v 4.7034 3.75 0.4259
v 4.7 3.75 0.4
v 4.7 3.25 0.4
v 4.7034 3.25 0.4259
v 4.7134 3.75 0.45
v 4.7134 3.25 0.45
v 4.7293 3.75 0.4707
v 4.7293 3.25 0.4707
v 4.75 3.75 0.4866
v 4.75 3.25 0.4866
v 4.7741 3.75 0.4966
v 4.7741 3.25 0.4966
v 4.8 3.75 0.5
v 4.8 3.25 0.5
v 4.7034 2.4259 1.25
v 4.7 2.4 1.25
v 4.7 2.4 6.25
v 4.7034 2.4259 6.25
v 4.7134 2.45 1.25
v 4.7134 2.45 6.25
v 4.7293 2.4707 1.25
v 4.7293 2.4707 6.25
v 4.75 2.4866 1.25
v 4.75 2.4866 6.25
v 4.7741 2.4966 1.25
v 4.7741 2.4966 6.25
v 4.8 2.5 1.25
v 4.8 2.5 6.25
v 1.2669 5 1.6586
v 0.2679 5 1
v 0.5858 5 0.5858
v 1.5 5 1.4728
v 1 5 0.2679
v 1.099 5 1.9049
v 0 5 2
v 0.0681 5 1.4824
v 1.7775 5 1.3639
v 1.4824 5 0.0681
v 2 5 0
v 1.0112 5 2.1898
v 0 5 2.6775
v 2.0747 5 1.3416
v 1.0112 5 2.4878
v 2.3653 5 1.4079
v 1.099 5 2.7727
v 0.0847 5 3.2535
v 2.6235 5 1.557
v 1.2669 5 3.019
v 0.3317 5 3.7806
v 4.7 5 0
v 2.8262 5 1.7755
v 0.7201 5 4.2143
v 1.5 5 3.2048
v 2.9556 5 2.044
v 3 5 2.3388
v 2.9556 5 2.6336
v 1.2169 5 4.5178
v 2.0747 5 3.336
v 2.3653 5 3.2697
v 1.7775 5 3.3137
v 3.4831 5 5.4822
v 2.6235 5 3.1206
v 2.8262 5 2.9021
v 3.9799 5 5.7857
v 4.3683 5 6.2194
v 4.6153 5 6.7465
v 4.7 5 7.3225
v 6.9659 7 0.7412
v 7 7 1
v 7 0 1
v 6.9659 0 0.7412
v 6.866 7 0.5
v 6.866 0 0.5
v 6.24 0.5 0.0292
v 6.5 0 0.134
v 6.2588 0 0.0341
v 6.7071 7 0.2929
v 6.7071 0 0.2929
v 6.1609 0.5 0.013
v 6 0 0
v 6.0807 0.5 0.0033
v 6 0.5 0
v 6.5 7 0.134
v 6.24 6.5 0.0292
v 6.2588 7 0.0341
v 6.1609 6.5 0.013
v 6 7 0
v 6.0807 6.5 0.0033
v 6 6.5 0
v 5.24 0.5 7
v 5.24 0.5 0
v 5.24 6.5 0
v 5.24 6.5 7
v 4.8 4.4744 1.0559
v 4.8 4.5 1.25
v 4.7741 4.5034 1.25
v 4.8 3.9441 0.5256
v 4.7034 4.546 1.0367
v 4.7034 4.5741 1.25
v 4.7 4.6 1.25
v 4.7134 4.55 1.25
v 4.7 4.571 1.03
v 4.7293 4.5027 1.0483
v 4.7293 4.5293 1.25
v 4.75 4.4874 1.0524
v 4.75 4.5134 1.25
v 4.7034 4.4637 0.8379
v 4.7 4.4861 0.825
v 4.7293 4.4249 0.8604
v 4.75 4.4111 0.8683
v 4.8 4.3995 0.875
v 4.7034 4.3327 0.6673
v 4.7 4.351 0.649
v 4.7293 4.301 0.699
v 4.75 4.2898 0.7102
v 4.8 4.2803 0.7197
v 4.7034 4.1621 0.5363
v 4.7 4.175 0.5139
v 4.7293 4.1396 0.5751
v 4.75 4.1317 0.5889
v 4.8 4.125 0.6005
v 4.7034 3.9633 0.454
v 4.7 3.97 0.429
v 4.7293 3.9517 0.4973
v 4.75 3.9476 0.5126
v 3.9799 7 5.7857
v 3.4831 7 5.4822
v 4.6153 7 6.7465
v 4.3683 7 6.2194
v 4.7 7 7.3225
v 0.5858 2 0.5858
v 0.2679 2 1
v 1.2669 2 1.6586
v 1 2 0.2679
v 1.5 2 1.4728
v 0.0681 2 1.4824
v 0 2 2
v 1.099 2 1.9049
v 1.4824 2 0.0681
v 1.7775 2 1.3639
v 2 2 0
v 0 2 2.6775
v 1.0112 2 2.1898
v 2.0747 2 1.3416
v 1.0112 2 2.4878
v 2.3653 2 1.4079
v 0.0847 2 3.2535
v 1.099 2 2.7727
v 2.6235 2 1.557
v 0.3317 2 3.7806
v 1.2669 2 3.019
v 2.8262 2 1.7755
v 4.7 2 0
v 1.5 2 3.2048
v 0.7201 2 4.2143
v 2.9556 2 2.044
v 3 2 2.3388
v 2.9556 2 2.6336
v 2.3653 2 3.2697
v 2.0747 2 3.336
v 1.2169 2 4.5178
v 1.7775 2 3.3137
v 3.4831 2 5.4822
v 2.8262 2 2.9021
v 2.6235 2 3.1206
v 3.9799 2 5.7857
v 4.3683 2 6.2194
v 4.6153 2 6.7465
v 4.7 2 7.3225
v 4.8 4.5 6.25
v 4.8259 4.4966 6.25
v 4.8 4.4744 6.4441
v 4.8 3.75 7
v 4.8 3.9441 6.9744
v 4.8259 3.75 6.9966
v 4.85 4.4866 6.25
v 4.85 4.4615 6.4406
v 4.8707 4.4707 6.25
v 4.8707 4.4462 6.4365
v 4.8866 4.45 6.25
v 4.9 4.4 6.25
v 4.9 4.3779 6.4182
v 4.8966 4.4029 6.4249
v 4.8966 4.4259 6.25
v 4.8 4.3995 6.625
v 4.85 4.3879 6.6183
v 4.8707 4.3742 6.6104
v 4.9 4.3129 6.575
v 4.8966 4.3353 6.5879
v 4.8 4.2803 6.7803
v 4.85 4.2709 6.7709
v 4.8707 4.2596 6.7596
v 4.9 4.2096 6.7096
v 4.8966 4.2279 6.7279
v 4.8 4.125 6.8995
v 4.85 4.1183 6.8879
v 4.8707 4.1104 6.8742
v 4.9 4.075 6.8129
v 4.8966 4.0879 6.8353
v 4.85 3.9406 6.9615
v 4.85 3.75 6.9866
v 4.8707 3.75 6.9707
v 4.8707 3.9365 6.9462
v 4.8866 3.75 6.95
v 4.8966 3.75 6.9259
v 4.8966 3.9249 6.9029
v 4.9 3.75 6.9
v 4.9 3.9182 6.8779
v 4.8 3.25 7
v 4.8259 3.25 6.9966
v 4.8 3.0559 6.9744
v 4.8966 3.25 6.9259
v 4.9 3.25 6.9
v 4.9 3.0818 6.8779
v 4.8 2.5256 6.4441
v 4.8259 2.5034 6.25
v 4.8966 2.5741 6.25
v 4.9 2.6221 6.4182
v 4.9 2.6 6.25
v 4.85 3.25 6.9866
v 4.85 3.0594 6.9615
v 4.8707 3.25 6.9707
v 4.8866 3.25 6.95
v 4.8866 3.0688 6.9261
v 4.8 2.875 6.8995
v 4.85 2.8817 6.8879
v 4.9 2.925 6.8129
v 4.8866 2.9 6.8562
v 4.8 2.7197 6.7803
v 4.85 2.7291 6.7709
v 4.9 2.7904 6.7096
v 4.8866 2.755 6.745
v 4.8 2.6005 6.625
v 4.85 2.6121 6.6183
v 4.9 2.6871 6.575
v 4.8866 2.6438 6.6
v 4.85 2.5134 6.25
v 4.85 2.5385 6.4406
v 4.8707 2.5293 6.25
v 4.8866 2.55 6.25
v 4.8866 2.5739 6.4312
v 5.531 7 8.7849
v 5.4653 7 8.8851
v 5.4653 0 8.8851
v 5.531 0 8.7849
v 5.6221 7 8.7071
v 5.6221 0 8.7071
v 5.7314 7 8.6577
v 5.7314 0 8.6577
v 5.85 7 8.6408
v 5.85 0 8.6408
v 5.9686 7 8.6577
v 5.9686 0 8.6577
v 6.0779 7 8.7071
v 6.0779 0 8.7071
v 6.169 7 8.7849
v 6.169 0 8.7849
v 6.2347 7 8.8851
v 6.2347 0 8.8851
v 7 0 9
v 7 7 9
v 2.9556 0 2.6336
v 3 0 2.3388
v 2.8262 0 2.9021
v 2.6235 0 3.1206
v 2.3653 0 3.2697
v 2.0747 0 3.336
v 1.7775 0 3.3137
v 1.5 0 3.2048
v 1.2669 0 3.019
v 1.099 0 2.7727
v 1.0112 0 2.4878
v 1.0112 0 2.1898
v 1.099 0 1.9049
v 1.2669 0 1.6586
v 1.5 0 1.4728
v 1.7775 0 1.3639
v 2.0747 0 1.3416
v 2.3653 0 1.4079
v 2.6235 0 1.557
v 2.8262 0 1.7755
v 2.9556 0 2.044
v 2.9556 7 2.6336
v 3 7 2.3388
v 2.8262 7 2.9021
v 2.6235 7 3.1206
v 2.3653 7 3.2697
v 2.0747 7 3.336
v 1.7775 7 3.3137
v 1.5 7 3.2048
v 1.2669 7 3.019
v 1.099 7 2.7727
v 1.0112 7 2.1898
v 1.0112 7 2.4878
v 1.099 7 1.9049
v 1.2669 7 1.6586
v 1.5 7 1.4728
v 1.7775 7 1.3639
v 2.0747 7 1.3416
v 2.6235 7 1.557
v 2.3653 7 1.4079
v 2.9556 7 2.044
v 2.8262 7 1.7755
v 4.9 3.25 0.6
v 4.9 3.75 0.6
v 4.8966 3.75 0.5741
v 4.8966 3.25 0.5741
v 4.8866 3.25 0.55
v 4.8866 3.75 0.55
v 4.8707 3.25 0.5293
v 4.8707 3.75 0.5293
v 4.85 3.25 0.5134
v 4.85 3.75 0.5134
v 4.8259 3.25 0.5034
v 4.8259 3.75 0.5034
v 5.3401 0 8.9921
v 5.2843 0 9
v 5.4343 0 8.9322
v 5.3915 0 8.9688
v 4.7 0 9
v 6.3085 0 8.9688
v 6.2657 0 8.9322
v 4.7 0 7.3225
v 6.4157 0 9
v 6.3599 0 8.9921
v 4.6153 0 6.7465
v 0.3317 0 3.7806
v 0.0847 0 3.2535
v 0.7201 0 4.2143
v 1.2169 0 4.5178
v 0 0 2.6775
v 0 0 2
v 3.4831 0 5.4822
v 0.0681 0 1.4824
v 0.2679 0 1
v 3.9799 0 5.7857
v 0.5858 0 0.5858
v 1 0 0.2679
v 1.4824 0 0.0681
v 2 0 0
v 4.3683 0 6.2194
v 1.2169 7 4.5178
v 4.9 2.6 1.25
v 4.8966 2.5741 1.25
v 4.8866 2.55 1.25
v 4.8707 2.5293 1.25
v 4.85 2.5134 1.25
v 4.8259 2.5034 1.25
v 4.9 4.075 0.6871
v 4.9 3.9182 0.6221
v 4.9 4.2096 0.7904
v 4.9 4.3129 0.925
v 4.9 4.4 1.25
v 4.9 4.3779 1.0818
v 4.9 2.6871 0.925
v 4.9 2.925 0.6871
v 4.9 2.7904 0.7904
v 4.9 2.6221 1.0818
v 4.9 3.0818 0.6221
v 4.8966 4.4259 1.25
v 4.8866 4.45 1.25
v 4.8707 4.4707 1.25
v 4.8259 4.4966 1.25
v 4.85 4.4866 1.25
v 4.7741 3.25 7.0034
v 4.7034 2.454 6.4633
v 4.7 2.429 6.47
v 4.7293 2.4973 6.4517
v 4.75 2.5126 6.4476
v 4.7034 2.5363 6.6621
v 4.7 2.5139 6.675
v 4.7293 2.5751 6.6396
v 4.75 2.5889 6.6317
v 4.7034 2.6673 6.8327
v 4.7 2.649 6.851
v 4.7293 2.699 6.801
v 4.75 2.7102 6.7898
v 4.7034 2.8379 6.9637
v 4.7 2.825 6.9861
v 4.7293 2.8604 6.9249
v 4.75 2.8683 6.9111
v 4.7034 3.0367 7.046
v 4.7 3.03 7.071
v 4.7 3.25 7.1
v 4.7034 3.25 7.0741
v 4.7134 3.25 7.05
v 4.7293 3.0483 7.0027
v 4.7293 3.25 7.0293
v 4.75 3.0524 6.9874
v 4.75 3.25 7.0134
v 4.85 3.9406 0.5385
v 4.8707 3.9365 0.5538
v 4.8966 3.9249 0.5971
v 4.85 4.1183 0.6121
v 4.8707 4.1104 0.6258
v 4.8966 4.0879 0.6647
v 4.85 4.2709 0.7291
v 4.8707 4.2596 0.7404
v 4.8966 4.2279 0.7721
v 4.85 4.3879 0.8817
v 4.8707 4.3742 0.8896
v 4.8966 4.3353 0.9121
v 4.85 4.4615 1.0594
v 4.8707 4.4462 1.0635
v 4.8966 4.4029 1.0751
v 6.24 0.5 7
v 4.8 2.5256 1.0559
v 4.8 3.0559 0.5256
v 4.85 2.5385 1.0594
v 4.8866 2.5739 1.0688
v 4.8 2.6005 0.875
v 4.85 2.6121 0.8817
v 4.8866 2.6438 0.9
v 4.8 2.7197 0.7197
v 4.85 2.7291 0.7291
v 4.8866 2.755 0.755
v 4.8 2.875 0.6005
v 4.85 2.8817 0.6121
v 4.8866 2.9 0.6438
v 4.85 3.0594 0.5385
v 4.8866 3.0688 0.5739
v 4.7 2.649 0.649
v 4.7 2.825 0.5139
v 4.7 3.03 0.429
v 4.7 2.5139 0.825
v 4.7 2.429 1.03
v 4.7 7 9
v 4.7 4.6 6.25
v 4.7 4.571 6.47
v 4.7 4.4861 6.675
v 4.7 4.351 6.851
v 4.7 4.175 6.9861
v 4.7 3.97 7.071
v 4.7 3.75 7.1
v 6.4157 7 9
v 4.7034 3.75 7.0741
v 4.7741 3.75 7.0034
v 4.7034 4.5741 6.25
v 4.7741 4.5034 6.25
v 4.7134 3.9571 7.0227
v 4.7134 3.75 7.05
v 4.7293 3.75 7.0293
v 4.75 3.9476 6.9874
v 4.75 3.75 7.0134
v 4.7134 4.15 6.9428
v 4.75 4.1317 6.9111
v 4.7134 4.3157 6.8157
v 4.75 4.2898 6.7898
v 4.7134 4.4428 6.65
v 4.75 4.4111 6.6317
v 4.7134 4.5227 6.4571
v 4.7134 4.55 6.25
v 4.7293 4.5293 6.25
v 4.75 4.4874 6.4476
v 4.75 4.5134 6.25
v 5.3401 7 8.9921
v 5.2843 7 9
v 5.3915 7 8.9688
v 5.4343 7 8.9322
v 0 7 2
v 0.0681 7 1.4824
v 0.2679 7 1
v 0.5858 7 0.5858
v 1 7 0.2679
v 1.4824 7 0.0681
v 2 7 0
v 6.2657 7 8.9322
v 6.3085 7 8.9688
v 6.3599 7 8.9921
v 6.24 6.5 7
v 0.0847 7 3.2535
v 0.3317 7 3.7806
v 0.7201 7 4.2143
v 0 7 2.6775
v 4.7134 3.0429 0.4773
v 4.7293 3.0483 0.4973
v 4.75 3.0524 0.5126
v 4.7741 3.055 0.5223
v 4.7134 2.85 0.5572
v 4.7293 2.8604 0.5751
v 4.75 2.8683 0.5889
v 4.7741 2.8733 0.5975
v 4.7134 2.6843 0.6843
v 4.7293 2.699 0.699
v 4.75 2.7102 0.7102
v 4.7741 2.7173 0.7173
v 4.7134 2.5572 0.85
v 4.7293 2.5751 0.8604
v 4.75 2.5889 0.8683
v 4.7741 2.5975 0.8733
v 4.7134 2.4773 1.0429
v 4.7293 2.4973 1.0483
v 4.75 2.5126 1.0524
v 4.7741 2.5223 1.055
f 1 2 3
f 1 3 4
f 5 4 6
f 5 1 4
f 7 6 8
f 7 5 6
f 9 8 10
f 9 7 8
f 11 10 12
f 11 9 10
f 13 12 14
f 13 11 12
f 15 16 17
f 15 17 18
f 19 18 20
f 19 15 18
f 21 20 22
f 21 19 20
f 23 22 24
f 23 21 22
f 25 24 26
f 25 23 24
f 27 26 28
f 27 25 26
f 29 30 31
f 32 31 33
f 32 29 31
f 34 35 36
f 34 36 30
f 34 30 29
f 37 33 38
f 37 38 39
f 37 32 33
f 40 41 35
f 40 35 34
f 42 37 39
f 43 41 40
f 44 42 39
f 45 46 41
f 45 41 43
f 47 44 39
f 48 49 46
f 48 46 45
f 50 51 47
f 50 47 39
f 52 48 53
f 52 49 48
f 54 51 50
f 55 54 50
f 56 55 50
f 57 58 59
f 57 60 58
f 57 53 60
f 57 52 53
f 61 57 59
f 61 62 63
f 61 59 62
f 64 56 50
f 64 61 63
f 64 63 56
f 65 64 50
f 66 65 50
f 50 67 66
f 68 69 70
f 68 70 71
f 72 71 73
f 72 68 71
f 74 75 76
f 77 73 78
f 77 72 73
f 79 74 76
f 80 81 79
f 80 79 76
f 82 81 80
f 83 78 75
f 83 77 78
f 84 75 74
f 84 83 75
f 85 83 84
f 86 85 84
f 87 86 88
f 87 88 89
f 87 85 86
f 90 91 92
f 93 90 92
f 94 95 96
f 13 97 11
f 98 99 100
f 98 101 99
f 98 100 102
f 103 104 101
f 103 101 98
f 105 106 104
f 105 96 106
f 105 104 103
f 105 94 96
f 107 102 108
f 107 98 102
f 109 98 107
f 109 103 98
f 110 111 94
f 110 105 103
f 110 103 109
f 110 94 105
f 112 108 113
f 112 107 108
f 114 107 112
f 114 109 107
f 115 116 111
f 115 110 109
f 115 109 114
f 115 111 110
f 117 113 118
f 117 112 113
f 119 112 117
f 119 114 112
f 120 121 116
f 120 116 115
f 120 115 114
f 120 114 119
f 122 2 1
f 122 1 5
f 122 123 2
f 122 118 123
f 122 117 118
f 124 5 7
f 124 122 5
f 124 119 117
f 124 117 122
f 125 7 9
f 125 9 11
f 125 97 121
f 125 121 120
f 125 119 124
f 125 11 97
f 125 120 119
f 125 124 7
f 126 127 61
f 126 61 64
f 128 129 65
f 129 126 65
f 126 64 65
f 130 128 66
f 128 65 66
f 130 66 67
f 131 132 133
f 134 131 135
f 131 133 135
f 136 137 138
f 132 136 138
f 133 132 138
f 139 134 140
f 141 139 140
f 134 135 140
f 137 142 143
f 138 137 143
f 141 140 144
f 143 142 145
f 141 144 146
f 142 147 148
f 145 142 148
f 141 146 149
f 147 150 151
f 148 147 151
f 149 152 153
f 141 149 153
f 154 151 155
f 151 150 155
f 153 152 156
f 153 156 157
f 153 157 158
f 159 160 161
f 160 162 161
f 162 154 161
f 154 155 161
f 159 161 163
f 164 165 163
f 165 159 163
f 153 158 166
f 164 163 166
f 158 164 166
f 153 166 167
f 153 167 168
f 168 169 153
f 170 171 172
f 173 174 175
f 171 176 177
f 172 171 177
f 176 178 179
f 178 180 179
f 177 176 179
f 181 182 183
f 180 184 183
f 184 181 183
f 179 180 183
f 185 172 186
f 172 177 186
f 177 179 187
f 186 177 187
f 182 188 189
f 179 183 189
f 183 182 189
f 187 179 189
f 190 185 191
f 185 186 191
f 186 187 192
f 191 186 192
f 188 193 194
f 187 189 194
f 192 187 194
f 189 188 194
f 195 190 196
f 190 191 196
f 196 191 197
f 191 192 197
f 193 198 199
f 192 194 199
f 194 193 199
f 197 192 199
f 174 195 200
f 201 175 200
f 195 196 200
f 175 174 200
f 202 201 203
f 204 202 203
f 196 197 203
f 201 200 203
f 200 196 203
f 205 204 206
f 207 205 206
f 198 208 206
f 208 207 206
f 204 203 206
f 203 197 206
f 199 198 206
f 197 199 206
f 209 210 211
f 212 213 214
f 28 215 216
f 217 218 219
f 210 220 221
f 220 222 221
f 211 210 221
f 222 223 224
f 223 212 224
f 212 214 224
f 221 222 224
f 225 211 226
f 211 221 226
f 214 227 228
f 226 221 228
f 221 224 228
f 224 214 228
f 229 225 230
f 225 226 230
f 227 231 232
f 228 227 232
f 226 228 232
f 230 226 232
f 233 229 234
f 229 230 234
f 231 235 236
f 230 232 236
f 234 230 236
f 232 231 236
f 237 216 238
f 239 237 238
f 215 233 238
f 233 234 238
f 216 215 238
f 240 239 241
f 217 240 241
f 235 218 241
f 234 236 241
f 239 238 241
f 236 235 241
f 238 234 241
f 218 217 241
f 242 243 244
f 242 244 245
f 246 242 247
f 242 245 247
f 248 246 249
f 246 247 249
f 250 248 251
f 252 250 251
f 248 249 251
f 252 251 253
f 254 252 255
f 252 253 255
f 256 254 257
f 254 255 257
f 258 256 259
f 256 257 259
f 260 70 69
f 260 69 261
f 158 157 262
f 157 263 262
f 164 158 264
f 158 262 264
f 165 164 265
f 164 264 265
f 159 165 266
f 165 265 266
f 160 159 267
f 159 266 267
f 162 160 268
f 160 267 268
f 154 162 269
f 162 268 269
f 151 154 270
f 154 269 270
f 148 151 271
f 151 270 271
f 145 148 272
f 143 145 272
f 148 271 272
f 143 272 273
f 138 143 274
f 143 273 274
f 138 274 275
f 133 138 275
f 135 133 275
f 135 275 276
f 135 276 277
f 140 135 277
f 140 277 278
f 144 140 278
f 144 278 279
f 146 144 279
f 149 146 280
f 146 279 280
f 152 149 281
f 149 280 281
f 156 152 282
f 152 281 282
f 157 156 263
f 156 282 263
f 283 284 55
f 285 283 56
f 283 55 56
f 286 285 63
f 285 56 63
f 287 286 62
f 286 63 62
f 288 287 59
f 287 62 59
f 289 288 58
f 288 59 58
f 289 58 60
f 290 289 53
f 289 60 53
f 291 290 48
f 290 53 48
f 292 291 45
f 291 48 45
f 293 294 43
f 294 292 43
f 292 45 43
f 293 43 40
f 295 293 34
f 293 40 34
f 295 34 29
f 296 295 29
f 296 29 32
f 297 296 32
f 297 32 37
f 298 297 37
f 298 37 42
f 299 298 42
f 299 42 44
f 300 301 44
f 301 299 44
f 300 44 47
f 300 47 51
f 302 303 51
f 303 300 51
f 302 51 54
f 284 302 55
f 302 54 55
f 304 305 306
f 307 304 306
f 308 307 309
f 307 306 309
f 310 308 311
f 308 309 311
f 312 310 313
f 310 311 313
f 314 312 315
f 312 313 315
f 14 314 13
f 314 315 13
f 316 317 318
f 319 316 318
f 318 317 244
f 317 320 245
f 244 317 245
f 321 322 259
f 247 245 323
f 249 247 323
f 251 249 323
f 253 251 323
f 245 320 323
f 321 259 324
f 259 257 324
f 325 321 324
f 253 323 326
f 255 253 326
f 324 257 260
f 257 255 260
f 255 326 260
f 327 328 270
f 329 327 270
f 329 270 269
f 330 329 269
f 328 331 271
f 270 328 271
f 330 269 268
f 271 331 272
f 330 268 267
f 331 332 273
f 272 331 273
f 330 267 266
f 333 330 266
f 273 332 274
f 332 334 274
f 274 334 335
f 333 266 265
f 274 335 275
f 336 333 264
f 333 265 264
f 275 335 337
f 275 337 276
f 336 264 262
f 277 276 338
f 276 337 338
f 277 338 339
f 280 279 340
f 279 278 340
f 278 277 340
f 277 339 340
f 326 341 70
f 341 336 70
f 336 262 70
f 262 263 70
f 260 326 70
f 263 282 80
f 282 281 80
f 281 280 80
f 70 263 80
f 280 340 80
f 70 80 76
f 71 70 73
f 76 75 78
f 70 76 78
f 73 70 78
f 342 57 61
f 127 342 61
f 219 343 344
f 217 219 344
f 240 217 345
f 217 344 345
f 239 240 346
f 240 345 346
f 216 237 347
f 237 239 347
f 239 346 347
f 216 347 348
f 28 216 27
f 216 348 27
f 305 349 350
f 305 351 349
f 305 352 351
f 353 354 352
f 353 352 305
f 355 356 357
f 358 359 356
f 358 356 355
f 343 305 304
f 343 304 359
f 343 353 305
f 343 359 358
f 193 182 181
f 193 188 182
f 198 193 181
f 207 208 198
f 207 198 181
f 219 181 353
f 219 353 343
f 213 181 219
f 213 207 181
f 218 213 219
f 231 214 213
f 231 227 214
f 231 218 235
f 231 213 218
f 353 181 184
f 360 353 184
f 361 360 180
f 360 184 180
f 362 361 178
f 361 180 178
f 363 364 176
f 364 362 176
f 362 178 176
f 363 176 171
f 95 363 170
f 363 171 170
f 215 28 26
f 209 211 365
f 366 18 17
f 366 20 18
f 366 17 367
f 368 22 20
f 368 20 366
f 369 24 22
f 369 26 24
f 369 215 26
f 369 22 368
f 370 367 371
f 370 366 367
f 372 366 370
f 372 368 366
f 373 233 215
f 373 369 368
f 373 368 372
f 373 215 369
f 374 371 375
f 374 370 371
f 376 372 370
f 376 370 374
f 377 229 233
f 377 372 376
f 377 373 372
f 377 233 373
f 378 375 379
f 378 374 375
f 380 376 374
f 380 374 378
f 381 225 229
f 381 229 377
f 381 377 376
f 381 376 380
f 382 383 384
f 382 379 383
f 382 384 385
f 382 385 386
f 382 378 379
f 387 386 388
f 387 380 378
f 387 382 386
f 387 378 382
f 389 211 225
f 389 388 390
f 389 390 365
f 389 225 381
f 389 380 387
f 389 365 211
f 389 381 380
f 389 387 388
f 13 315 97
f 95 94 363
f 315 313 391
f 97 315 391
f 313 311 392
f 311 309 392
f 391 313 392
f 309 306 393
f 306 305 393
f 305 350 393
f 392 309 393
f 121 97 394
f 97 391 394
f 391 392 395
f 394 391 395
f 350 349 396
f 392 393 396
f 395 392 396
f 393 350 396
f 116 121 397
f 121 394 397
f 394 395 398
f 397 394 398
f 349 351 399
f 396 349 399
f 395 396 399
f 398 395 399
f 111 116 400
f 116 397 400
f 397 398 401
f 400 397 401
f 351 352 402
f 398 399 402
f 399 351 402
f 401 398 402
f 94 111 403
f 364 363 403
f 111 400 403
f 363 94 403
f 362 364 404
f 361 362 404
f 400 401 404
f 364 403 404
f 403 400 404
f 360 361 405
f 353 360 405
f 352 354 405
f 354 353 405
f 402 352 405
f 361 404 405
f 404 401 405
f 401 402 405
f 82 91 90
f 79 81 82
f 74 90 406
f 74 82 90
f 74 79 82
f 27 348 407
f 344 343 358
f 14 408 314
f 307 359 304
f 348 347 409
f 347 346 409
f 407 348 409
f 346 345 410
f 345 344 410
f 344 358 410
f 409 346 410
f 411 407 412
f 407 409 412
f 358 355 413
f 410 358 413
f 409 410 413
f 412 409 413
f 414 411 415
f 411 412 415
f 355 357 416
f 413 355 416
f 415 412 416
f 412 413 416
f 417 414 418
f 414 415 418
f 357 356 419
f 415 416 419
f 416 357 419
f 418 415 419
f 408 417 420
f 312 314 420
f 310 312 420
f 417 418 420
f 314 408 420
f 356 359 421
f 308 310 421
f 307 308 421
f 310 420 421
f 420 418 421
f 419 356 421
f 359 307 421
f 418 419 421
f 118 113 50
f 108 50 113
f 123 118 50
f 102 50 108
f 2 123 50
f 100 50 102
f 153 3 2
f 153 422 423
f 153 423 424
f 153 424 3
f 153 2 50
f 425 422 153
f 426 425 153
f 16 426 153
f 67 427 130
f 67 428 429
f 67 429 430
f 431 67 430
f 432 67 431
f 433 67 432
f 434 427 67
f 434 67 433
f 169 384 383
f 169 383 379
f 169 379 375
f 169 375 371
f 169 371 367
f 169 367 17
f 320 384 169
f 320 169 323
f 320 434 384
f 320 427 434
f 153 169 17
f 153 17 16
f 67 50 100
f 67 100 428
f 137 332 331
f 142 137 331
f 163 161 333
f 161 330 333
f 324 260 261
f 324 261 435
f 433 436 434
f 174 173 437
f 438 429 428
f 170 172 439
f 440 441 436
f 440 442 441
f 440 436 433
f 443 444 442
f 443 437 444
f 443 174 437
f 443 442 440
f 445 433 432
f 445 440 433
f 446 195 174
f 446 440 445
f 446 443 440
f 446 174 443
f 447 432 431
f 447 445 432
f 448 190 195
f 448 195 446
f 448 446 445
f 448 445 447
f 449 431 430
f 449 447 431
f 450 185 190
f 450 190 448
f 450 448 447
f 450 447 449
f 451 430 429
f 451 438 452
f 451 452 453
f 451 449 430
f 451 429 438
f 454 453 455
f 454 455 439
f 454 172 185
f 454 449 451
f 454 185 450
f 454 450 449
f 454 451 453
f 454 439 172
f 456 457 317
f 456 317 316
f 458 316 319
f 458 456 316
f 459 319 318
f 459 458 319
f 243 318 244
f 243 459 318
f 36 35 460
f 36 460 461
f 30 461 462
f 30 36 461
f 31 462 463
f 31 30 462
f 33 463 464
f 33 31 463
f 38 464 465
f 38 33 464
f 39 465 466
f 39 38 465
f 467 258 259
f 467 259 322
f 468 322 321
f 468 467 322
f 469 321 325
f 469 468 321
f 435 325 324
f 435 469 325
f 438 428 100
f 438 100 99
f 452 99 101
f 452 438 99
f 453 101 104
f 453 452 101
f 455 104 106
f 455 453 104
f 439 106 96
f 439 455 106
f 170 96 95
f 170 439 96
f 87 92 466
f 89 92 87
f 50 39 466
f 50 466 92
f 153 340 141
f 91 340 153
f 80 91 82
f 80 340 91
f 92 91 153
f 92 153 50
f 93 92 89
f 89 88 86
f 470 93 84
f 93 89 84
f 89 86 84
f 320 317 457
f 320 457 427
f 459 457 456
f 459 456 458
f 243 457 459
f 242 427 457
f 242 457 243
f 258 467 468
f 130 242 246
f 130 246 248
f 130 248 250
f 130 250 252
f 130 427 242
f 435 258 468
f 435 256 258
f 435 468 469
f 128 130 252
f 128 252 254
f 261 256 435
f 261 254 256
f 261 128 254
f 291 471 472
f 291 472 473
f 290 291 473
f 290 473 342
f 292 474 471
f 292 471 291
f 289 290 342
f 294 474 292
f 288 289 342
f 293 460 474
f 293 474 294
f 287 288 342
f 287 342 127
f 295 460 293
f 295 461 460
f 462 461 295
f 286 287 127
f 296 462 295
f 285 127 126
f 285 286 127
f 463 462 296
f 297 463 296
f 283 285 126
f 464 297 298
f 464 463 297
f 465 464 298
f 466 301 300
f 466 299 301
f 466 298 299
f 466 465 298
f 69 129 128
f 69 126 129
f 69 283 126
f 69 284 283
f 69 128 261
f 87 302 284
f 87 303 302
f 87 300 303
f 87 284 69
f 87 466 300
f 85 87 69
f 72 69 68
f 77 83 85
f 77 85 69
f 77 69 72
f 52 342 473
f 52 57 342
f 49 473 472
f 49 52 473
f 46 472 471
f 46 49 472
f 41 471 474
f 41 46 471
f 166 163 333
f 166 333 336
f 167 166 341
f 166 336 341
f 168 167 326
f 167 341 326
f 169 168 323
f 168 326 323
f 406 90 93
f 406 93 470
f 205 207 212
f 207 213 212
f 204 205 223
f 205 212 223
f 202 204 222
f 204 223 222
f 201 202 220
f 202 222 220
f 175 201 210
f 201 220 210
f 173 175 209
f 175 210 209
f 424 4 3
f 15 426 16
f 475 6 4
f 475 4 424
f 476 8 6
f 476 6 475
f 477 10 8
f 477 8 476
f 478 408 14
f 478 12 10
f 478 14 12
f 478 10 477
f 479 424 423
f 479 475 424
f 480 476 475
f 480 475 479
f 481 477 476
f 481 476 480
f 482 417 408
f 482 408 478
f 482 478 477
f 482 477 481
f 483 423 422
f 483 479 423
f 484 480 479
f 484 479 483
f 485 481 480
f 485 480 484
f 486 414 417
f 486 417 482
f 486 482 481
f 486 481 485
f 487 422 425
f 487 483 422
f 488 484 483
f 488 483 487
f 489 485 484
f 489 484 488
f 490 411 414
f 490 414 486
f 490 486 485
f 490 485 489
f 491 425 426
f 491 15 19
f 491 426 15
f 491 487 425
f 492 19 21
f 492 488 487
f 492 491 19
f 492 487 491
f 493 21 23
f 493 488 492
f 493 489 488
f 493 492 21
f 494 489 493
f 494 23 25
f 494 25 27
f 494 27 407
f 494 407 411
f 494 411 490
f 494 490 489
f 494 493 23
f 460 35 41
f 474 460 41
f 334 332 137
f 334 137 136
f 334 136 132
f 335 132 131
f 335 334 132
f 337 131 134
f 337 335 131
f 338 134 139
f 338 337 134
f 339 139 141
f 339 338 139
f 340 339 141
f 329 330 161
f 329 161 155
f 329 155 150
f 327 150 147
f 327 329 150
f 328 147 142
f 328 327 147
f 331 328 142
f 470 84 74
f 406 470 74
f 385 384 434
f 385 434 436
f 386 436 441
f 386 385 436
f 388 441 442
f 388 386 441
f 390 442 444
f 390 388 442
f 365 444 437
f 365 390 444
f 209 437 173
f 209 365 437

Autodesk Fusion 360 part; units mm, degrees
sketch "Sketch1" plane through (0, 0, 0) normal (0, 1, 0) x (1, 0, 0)
  line L0 (2, 0) -> (7, 0)
  line L1 (7, 0) -> (7, -9)
  line L2 (7, -9) -> (4.7, -9)
  line L3 (4.7, -9) -> (4.7, -7.3225)
  line L4 (0, -2) -> (0, -2.6775)
  line L5 (1.2169, -4.5178) -> (3.4831, -5.4822)
  arc A0 (4.7, -7.3225) -> (3.4831, -5.4822) centre (2.7, -7.3225) ccw
  arc A1 (0, -2.6775) -> (1.2169, -4.5178) centre (2, -2.6775) ccw
  arc A2 (2, 0) -> (0, -2) centre (2, -2) ccw
  circle A3 centre (2, -2.3388) radius 1
  point P0 (4.7, -6)
  point P1 (0, -4)
  dimension "d1" = 7
  dimension "d3" = 2.3
  dimension "d4" = 3
  dimension "d5" = 4
  dimension "d6" = 2
  dimension "d7" = 2
  dimension "d8" = 2
  dimension "d10" = 2
extrude "Extrude1" add sketch "Sketch1" along normal blind 7
sketch "Sketch2" plane through (0, 0, 9) normal (0, 0, 1) x (-1, 0, 0)
  line L0 (-4.7, 0) -> (-7, 0)
  line L1 (-7, 0) -> (-7, -7)
  line L2 (-7, -7) -> (-4.7, -7)
  line L3 (-4.7, -7) -> (-4.7, 0)
  line L4 (-4.7, -7) -> (0, -7)
  line L5 (0, -7) -> (0, -5)
  line L6 (0, -5) -> (-4.7, -5)
  line L7 (-4.7, -5) -> (-4.7, -7)
  line L8 (-4.7, 0) -> (0, 0)
  line L9 (0, 0) -> (0, -2)
  line L10 (0, -2) -> (-4.7, -2)
  line L11 (-4.7, -2) -> (-4.7, 0)
  line L12 (0, -5) -> (-4.7, -5)
  line L13 (-4.7, -5) -> (-4.7, -2)
  line L14 (-4.7, -2) -> (0, -2)
  line L15 (0, -2) -> (0, -5)
extrude "Extrude2" cut sketch "Sketch2" against normal blind 10 contours L3 L6 L10 L12 L13 L14 L15
sketch "Sketch3" plane through (4.7, 0, 0) normal (-1, 0, 0) x (0, -1, 0)
  line L0 (0, 9) -> (-7, 9)
  line L1 (-7, 9) -> (-7, 7.3225)
  line L2 (-7, 7.3225) -> (-5, 7.3225)
  line L3 (-5, 7.3225) -> (-5, 0)
  line L4 (-5, 0) -> (-2, 0)
  line L5 (-2, 0) -> (-2, 7.3225)
  line L6 (-2, 7.3225) -> (0, 7.3225)
  line L7 (0, 7.3225) -> (0, 9)
  line L8 (-3.75, 7) -> (-3.25, 7)
  line L9 (-2.5, 6.25) -> (-2.5, 1.25)
  line L10 (-3.25, 0.5) -> (-3.75, 0.5)
  line L11 (-4.5, 1.25) -> (-4.5, 6.25)
  arc A0 (-3.75, 7) -> (-4.5, 6.25) centre (-3.75, 6.25) ccw
  arc A1 (-2.5, 6.25) -> (-3.25, 7) centre (-3.25, 6.25) ccw
  arc A2 (-4.5, 1.25) -> (-3.75, 0.5) centre (-3.75, 1.25) ccw
  arc A3 (-3.25, 0.5) -> (-2.5, 1.25) centre (-3.25, 1.25) ccw
  dimension "d15" = 0.75
extrude "Extrude3" cut sketch "Sketch3" against normal blind 0.2 contours L8 L9 L10 L11 A0 A1 A2 A3
fillet "Fillet1" radius 0.1 8 edges at (4.9, 3.5, 7) (4.9, 2.7197, 6.7803) (4.9, 2.5, 3.75) (4.9, 2.7197, 0.7197) (4.9, 3.5, 0.5) (4.9, 4.2803, 0.7197) (4.9, 4.5, 3.75) (4.9, 4.2803, 6.7803)
sketch "Sketch4" plane through (0, 0, 0) normal (0, -1, 0) x (1, 0, 0)
  circle A0 centre (2, 2.3388) radius 1
  line L0 (2, 0) -> (7, 0)
  line L1 (7, 0) -> (7, 9)
  line L2 (7, 9) -> (4.7, 9)
  line L3 (4.7, 9) -> (4.7, 7.3225)
  arc A1 (3.4831, 5.4822) -> (4.7, 7.3225) centre (2.7, 7.3225) ccw
  line L4 (3.4831, 5.4822) -> (1.2169, 4.5178)
  arc A2 (1.2169, 4.5178) -> (0, 2.6775) centre (2, 2.6775) ccw
  line L5 (0, 2.6775) -> (0, 2)
  arc A3 (0, 2) -> (2, 0) centre (2, 2) ccw
  line L6 (4.7, 9) -> (5.43, 9)
  line L7 (7, 9) -> (6.27, 9)
  arc A4 (5.43, 9) -> (6.27, 9) centre (5.85, 9.066) ccw
  line L8 (5.43, 9) -> (6.27, 9)
  dimension "d20" = 0.73
  dimension "d21" = 0.73
extrude "Extrude4" cut sketch "Sketch4" against normal blind 7 contours L2 A4 L8
fillet "Fillet2" radius 0.2 2 edges at (5.43, 3.5, 9) (6.27, 3.5, 9)
fillet "Fillet4" radius 1 1 edges at (7, 3.5, 0)
sketch "Sketch5" plane through (0, 0, 0) normal (0, 0, -1) x (1, 0, 0)
  line L0 (6, -7) -> (6, 0)
  line L1 (6, 0) -> (2, 0)
  line L2 (2, 0) -> (2, -2)
  line L3 (2, -2) -> (4.7, -2)
  line L4 (4.7, -2) -> (4.7, -5)
  line L5 (4.7, -5) -> (2, -5)
  line L6 (2, -5) -> (2, -7)
  line L7 (2, -7) -> (6, -7)
  line L8 (7, 0) -> (6.24, 0)
  line L9 (6.24, 0) -> (5.24, 0)
  line L10 (5.24, 0) -> (5.24, -6.5)
  line L11 (6.24, -6.5) -> (6.24, 0)
  line L12 (5.24, 0) -> (5.24, -0.5)
  line L13 (5.24, -0.5) -> (6.24, -0.5)
  line L14 (5.24, -6.5) -> (6.24, -6.5)
  dimension "d30" = 0.76
  dimension "d31" = 1
  dimension "d33" = 0.5
extrude "Extrude5" cut sketch "Sketch5" against normal blind 7 contours L0 L10 L13 L14 | L0 L11 L13 L14
fillet "Fillet5" radius 0.1 8 edges at (4.7, 3.5, 7) (4.7, 2.7197, 6.7803) (4.7, 2.5, 3.75) (4.7, 2.7197, 0.7197) (4.7, 3.5, 0.5) (4.7, 4.2803, 0.7197) (4.7, 4.5, 3.75) (4.7, 4.2803, 6.7803)
